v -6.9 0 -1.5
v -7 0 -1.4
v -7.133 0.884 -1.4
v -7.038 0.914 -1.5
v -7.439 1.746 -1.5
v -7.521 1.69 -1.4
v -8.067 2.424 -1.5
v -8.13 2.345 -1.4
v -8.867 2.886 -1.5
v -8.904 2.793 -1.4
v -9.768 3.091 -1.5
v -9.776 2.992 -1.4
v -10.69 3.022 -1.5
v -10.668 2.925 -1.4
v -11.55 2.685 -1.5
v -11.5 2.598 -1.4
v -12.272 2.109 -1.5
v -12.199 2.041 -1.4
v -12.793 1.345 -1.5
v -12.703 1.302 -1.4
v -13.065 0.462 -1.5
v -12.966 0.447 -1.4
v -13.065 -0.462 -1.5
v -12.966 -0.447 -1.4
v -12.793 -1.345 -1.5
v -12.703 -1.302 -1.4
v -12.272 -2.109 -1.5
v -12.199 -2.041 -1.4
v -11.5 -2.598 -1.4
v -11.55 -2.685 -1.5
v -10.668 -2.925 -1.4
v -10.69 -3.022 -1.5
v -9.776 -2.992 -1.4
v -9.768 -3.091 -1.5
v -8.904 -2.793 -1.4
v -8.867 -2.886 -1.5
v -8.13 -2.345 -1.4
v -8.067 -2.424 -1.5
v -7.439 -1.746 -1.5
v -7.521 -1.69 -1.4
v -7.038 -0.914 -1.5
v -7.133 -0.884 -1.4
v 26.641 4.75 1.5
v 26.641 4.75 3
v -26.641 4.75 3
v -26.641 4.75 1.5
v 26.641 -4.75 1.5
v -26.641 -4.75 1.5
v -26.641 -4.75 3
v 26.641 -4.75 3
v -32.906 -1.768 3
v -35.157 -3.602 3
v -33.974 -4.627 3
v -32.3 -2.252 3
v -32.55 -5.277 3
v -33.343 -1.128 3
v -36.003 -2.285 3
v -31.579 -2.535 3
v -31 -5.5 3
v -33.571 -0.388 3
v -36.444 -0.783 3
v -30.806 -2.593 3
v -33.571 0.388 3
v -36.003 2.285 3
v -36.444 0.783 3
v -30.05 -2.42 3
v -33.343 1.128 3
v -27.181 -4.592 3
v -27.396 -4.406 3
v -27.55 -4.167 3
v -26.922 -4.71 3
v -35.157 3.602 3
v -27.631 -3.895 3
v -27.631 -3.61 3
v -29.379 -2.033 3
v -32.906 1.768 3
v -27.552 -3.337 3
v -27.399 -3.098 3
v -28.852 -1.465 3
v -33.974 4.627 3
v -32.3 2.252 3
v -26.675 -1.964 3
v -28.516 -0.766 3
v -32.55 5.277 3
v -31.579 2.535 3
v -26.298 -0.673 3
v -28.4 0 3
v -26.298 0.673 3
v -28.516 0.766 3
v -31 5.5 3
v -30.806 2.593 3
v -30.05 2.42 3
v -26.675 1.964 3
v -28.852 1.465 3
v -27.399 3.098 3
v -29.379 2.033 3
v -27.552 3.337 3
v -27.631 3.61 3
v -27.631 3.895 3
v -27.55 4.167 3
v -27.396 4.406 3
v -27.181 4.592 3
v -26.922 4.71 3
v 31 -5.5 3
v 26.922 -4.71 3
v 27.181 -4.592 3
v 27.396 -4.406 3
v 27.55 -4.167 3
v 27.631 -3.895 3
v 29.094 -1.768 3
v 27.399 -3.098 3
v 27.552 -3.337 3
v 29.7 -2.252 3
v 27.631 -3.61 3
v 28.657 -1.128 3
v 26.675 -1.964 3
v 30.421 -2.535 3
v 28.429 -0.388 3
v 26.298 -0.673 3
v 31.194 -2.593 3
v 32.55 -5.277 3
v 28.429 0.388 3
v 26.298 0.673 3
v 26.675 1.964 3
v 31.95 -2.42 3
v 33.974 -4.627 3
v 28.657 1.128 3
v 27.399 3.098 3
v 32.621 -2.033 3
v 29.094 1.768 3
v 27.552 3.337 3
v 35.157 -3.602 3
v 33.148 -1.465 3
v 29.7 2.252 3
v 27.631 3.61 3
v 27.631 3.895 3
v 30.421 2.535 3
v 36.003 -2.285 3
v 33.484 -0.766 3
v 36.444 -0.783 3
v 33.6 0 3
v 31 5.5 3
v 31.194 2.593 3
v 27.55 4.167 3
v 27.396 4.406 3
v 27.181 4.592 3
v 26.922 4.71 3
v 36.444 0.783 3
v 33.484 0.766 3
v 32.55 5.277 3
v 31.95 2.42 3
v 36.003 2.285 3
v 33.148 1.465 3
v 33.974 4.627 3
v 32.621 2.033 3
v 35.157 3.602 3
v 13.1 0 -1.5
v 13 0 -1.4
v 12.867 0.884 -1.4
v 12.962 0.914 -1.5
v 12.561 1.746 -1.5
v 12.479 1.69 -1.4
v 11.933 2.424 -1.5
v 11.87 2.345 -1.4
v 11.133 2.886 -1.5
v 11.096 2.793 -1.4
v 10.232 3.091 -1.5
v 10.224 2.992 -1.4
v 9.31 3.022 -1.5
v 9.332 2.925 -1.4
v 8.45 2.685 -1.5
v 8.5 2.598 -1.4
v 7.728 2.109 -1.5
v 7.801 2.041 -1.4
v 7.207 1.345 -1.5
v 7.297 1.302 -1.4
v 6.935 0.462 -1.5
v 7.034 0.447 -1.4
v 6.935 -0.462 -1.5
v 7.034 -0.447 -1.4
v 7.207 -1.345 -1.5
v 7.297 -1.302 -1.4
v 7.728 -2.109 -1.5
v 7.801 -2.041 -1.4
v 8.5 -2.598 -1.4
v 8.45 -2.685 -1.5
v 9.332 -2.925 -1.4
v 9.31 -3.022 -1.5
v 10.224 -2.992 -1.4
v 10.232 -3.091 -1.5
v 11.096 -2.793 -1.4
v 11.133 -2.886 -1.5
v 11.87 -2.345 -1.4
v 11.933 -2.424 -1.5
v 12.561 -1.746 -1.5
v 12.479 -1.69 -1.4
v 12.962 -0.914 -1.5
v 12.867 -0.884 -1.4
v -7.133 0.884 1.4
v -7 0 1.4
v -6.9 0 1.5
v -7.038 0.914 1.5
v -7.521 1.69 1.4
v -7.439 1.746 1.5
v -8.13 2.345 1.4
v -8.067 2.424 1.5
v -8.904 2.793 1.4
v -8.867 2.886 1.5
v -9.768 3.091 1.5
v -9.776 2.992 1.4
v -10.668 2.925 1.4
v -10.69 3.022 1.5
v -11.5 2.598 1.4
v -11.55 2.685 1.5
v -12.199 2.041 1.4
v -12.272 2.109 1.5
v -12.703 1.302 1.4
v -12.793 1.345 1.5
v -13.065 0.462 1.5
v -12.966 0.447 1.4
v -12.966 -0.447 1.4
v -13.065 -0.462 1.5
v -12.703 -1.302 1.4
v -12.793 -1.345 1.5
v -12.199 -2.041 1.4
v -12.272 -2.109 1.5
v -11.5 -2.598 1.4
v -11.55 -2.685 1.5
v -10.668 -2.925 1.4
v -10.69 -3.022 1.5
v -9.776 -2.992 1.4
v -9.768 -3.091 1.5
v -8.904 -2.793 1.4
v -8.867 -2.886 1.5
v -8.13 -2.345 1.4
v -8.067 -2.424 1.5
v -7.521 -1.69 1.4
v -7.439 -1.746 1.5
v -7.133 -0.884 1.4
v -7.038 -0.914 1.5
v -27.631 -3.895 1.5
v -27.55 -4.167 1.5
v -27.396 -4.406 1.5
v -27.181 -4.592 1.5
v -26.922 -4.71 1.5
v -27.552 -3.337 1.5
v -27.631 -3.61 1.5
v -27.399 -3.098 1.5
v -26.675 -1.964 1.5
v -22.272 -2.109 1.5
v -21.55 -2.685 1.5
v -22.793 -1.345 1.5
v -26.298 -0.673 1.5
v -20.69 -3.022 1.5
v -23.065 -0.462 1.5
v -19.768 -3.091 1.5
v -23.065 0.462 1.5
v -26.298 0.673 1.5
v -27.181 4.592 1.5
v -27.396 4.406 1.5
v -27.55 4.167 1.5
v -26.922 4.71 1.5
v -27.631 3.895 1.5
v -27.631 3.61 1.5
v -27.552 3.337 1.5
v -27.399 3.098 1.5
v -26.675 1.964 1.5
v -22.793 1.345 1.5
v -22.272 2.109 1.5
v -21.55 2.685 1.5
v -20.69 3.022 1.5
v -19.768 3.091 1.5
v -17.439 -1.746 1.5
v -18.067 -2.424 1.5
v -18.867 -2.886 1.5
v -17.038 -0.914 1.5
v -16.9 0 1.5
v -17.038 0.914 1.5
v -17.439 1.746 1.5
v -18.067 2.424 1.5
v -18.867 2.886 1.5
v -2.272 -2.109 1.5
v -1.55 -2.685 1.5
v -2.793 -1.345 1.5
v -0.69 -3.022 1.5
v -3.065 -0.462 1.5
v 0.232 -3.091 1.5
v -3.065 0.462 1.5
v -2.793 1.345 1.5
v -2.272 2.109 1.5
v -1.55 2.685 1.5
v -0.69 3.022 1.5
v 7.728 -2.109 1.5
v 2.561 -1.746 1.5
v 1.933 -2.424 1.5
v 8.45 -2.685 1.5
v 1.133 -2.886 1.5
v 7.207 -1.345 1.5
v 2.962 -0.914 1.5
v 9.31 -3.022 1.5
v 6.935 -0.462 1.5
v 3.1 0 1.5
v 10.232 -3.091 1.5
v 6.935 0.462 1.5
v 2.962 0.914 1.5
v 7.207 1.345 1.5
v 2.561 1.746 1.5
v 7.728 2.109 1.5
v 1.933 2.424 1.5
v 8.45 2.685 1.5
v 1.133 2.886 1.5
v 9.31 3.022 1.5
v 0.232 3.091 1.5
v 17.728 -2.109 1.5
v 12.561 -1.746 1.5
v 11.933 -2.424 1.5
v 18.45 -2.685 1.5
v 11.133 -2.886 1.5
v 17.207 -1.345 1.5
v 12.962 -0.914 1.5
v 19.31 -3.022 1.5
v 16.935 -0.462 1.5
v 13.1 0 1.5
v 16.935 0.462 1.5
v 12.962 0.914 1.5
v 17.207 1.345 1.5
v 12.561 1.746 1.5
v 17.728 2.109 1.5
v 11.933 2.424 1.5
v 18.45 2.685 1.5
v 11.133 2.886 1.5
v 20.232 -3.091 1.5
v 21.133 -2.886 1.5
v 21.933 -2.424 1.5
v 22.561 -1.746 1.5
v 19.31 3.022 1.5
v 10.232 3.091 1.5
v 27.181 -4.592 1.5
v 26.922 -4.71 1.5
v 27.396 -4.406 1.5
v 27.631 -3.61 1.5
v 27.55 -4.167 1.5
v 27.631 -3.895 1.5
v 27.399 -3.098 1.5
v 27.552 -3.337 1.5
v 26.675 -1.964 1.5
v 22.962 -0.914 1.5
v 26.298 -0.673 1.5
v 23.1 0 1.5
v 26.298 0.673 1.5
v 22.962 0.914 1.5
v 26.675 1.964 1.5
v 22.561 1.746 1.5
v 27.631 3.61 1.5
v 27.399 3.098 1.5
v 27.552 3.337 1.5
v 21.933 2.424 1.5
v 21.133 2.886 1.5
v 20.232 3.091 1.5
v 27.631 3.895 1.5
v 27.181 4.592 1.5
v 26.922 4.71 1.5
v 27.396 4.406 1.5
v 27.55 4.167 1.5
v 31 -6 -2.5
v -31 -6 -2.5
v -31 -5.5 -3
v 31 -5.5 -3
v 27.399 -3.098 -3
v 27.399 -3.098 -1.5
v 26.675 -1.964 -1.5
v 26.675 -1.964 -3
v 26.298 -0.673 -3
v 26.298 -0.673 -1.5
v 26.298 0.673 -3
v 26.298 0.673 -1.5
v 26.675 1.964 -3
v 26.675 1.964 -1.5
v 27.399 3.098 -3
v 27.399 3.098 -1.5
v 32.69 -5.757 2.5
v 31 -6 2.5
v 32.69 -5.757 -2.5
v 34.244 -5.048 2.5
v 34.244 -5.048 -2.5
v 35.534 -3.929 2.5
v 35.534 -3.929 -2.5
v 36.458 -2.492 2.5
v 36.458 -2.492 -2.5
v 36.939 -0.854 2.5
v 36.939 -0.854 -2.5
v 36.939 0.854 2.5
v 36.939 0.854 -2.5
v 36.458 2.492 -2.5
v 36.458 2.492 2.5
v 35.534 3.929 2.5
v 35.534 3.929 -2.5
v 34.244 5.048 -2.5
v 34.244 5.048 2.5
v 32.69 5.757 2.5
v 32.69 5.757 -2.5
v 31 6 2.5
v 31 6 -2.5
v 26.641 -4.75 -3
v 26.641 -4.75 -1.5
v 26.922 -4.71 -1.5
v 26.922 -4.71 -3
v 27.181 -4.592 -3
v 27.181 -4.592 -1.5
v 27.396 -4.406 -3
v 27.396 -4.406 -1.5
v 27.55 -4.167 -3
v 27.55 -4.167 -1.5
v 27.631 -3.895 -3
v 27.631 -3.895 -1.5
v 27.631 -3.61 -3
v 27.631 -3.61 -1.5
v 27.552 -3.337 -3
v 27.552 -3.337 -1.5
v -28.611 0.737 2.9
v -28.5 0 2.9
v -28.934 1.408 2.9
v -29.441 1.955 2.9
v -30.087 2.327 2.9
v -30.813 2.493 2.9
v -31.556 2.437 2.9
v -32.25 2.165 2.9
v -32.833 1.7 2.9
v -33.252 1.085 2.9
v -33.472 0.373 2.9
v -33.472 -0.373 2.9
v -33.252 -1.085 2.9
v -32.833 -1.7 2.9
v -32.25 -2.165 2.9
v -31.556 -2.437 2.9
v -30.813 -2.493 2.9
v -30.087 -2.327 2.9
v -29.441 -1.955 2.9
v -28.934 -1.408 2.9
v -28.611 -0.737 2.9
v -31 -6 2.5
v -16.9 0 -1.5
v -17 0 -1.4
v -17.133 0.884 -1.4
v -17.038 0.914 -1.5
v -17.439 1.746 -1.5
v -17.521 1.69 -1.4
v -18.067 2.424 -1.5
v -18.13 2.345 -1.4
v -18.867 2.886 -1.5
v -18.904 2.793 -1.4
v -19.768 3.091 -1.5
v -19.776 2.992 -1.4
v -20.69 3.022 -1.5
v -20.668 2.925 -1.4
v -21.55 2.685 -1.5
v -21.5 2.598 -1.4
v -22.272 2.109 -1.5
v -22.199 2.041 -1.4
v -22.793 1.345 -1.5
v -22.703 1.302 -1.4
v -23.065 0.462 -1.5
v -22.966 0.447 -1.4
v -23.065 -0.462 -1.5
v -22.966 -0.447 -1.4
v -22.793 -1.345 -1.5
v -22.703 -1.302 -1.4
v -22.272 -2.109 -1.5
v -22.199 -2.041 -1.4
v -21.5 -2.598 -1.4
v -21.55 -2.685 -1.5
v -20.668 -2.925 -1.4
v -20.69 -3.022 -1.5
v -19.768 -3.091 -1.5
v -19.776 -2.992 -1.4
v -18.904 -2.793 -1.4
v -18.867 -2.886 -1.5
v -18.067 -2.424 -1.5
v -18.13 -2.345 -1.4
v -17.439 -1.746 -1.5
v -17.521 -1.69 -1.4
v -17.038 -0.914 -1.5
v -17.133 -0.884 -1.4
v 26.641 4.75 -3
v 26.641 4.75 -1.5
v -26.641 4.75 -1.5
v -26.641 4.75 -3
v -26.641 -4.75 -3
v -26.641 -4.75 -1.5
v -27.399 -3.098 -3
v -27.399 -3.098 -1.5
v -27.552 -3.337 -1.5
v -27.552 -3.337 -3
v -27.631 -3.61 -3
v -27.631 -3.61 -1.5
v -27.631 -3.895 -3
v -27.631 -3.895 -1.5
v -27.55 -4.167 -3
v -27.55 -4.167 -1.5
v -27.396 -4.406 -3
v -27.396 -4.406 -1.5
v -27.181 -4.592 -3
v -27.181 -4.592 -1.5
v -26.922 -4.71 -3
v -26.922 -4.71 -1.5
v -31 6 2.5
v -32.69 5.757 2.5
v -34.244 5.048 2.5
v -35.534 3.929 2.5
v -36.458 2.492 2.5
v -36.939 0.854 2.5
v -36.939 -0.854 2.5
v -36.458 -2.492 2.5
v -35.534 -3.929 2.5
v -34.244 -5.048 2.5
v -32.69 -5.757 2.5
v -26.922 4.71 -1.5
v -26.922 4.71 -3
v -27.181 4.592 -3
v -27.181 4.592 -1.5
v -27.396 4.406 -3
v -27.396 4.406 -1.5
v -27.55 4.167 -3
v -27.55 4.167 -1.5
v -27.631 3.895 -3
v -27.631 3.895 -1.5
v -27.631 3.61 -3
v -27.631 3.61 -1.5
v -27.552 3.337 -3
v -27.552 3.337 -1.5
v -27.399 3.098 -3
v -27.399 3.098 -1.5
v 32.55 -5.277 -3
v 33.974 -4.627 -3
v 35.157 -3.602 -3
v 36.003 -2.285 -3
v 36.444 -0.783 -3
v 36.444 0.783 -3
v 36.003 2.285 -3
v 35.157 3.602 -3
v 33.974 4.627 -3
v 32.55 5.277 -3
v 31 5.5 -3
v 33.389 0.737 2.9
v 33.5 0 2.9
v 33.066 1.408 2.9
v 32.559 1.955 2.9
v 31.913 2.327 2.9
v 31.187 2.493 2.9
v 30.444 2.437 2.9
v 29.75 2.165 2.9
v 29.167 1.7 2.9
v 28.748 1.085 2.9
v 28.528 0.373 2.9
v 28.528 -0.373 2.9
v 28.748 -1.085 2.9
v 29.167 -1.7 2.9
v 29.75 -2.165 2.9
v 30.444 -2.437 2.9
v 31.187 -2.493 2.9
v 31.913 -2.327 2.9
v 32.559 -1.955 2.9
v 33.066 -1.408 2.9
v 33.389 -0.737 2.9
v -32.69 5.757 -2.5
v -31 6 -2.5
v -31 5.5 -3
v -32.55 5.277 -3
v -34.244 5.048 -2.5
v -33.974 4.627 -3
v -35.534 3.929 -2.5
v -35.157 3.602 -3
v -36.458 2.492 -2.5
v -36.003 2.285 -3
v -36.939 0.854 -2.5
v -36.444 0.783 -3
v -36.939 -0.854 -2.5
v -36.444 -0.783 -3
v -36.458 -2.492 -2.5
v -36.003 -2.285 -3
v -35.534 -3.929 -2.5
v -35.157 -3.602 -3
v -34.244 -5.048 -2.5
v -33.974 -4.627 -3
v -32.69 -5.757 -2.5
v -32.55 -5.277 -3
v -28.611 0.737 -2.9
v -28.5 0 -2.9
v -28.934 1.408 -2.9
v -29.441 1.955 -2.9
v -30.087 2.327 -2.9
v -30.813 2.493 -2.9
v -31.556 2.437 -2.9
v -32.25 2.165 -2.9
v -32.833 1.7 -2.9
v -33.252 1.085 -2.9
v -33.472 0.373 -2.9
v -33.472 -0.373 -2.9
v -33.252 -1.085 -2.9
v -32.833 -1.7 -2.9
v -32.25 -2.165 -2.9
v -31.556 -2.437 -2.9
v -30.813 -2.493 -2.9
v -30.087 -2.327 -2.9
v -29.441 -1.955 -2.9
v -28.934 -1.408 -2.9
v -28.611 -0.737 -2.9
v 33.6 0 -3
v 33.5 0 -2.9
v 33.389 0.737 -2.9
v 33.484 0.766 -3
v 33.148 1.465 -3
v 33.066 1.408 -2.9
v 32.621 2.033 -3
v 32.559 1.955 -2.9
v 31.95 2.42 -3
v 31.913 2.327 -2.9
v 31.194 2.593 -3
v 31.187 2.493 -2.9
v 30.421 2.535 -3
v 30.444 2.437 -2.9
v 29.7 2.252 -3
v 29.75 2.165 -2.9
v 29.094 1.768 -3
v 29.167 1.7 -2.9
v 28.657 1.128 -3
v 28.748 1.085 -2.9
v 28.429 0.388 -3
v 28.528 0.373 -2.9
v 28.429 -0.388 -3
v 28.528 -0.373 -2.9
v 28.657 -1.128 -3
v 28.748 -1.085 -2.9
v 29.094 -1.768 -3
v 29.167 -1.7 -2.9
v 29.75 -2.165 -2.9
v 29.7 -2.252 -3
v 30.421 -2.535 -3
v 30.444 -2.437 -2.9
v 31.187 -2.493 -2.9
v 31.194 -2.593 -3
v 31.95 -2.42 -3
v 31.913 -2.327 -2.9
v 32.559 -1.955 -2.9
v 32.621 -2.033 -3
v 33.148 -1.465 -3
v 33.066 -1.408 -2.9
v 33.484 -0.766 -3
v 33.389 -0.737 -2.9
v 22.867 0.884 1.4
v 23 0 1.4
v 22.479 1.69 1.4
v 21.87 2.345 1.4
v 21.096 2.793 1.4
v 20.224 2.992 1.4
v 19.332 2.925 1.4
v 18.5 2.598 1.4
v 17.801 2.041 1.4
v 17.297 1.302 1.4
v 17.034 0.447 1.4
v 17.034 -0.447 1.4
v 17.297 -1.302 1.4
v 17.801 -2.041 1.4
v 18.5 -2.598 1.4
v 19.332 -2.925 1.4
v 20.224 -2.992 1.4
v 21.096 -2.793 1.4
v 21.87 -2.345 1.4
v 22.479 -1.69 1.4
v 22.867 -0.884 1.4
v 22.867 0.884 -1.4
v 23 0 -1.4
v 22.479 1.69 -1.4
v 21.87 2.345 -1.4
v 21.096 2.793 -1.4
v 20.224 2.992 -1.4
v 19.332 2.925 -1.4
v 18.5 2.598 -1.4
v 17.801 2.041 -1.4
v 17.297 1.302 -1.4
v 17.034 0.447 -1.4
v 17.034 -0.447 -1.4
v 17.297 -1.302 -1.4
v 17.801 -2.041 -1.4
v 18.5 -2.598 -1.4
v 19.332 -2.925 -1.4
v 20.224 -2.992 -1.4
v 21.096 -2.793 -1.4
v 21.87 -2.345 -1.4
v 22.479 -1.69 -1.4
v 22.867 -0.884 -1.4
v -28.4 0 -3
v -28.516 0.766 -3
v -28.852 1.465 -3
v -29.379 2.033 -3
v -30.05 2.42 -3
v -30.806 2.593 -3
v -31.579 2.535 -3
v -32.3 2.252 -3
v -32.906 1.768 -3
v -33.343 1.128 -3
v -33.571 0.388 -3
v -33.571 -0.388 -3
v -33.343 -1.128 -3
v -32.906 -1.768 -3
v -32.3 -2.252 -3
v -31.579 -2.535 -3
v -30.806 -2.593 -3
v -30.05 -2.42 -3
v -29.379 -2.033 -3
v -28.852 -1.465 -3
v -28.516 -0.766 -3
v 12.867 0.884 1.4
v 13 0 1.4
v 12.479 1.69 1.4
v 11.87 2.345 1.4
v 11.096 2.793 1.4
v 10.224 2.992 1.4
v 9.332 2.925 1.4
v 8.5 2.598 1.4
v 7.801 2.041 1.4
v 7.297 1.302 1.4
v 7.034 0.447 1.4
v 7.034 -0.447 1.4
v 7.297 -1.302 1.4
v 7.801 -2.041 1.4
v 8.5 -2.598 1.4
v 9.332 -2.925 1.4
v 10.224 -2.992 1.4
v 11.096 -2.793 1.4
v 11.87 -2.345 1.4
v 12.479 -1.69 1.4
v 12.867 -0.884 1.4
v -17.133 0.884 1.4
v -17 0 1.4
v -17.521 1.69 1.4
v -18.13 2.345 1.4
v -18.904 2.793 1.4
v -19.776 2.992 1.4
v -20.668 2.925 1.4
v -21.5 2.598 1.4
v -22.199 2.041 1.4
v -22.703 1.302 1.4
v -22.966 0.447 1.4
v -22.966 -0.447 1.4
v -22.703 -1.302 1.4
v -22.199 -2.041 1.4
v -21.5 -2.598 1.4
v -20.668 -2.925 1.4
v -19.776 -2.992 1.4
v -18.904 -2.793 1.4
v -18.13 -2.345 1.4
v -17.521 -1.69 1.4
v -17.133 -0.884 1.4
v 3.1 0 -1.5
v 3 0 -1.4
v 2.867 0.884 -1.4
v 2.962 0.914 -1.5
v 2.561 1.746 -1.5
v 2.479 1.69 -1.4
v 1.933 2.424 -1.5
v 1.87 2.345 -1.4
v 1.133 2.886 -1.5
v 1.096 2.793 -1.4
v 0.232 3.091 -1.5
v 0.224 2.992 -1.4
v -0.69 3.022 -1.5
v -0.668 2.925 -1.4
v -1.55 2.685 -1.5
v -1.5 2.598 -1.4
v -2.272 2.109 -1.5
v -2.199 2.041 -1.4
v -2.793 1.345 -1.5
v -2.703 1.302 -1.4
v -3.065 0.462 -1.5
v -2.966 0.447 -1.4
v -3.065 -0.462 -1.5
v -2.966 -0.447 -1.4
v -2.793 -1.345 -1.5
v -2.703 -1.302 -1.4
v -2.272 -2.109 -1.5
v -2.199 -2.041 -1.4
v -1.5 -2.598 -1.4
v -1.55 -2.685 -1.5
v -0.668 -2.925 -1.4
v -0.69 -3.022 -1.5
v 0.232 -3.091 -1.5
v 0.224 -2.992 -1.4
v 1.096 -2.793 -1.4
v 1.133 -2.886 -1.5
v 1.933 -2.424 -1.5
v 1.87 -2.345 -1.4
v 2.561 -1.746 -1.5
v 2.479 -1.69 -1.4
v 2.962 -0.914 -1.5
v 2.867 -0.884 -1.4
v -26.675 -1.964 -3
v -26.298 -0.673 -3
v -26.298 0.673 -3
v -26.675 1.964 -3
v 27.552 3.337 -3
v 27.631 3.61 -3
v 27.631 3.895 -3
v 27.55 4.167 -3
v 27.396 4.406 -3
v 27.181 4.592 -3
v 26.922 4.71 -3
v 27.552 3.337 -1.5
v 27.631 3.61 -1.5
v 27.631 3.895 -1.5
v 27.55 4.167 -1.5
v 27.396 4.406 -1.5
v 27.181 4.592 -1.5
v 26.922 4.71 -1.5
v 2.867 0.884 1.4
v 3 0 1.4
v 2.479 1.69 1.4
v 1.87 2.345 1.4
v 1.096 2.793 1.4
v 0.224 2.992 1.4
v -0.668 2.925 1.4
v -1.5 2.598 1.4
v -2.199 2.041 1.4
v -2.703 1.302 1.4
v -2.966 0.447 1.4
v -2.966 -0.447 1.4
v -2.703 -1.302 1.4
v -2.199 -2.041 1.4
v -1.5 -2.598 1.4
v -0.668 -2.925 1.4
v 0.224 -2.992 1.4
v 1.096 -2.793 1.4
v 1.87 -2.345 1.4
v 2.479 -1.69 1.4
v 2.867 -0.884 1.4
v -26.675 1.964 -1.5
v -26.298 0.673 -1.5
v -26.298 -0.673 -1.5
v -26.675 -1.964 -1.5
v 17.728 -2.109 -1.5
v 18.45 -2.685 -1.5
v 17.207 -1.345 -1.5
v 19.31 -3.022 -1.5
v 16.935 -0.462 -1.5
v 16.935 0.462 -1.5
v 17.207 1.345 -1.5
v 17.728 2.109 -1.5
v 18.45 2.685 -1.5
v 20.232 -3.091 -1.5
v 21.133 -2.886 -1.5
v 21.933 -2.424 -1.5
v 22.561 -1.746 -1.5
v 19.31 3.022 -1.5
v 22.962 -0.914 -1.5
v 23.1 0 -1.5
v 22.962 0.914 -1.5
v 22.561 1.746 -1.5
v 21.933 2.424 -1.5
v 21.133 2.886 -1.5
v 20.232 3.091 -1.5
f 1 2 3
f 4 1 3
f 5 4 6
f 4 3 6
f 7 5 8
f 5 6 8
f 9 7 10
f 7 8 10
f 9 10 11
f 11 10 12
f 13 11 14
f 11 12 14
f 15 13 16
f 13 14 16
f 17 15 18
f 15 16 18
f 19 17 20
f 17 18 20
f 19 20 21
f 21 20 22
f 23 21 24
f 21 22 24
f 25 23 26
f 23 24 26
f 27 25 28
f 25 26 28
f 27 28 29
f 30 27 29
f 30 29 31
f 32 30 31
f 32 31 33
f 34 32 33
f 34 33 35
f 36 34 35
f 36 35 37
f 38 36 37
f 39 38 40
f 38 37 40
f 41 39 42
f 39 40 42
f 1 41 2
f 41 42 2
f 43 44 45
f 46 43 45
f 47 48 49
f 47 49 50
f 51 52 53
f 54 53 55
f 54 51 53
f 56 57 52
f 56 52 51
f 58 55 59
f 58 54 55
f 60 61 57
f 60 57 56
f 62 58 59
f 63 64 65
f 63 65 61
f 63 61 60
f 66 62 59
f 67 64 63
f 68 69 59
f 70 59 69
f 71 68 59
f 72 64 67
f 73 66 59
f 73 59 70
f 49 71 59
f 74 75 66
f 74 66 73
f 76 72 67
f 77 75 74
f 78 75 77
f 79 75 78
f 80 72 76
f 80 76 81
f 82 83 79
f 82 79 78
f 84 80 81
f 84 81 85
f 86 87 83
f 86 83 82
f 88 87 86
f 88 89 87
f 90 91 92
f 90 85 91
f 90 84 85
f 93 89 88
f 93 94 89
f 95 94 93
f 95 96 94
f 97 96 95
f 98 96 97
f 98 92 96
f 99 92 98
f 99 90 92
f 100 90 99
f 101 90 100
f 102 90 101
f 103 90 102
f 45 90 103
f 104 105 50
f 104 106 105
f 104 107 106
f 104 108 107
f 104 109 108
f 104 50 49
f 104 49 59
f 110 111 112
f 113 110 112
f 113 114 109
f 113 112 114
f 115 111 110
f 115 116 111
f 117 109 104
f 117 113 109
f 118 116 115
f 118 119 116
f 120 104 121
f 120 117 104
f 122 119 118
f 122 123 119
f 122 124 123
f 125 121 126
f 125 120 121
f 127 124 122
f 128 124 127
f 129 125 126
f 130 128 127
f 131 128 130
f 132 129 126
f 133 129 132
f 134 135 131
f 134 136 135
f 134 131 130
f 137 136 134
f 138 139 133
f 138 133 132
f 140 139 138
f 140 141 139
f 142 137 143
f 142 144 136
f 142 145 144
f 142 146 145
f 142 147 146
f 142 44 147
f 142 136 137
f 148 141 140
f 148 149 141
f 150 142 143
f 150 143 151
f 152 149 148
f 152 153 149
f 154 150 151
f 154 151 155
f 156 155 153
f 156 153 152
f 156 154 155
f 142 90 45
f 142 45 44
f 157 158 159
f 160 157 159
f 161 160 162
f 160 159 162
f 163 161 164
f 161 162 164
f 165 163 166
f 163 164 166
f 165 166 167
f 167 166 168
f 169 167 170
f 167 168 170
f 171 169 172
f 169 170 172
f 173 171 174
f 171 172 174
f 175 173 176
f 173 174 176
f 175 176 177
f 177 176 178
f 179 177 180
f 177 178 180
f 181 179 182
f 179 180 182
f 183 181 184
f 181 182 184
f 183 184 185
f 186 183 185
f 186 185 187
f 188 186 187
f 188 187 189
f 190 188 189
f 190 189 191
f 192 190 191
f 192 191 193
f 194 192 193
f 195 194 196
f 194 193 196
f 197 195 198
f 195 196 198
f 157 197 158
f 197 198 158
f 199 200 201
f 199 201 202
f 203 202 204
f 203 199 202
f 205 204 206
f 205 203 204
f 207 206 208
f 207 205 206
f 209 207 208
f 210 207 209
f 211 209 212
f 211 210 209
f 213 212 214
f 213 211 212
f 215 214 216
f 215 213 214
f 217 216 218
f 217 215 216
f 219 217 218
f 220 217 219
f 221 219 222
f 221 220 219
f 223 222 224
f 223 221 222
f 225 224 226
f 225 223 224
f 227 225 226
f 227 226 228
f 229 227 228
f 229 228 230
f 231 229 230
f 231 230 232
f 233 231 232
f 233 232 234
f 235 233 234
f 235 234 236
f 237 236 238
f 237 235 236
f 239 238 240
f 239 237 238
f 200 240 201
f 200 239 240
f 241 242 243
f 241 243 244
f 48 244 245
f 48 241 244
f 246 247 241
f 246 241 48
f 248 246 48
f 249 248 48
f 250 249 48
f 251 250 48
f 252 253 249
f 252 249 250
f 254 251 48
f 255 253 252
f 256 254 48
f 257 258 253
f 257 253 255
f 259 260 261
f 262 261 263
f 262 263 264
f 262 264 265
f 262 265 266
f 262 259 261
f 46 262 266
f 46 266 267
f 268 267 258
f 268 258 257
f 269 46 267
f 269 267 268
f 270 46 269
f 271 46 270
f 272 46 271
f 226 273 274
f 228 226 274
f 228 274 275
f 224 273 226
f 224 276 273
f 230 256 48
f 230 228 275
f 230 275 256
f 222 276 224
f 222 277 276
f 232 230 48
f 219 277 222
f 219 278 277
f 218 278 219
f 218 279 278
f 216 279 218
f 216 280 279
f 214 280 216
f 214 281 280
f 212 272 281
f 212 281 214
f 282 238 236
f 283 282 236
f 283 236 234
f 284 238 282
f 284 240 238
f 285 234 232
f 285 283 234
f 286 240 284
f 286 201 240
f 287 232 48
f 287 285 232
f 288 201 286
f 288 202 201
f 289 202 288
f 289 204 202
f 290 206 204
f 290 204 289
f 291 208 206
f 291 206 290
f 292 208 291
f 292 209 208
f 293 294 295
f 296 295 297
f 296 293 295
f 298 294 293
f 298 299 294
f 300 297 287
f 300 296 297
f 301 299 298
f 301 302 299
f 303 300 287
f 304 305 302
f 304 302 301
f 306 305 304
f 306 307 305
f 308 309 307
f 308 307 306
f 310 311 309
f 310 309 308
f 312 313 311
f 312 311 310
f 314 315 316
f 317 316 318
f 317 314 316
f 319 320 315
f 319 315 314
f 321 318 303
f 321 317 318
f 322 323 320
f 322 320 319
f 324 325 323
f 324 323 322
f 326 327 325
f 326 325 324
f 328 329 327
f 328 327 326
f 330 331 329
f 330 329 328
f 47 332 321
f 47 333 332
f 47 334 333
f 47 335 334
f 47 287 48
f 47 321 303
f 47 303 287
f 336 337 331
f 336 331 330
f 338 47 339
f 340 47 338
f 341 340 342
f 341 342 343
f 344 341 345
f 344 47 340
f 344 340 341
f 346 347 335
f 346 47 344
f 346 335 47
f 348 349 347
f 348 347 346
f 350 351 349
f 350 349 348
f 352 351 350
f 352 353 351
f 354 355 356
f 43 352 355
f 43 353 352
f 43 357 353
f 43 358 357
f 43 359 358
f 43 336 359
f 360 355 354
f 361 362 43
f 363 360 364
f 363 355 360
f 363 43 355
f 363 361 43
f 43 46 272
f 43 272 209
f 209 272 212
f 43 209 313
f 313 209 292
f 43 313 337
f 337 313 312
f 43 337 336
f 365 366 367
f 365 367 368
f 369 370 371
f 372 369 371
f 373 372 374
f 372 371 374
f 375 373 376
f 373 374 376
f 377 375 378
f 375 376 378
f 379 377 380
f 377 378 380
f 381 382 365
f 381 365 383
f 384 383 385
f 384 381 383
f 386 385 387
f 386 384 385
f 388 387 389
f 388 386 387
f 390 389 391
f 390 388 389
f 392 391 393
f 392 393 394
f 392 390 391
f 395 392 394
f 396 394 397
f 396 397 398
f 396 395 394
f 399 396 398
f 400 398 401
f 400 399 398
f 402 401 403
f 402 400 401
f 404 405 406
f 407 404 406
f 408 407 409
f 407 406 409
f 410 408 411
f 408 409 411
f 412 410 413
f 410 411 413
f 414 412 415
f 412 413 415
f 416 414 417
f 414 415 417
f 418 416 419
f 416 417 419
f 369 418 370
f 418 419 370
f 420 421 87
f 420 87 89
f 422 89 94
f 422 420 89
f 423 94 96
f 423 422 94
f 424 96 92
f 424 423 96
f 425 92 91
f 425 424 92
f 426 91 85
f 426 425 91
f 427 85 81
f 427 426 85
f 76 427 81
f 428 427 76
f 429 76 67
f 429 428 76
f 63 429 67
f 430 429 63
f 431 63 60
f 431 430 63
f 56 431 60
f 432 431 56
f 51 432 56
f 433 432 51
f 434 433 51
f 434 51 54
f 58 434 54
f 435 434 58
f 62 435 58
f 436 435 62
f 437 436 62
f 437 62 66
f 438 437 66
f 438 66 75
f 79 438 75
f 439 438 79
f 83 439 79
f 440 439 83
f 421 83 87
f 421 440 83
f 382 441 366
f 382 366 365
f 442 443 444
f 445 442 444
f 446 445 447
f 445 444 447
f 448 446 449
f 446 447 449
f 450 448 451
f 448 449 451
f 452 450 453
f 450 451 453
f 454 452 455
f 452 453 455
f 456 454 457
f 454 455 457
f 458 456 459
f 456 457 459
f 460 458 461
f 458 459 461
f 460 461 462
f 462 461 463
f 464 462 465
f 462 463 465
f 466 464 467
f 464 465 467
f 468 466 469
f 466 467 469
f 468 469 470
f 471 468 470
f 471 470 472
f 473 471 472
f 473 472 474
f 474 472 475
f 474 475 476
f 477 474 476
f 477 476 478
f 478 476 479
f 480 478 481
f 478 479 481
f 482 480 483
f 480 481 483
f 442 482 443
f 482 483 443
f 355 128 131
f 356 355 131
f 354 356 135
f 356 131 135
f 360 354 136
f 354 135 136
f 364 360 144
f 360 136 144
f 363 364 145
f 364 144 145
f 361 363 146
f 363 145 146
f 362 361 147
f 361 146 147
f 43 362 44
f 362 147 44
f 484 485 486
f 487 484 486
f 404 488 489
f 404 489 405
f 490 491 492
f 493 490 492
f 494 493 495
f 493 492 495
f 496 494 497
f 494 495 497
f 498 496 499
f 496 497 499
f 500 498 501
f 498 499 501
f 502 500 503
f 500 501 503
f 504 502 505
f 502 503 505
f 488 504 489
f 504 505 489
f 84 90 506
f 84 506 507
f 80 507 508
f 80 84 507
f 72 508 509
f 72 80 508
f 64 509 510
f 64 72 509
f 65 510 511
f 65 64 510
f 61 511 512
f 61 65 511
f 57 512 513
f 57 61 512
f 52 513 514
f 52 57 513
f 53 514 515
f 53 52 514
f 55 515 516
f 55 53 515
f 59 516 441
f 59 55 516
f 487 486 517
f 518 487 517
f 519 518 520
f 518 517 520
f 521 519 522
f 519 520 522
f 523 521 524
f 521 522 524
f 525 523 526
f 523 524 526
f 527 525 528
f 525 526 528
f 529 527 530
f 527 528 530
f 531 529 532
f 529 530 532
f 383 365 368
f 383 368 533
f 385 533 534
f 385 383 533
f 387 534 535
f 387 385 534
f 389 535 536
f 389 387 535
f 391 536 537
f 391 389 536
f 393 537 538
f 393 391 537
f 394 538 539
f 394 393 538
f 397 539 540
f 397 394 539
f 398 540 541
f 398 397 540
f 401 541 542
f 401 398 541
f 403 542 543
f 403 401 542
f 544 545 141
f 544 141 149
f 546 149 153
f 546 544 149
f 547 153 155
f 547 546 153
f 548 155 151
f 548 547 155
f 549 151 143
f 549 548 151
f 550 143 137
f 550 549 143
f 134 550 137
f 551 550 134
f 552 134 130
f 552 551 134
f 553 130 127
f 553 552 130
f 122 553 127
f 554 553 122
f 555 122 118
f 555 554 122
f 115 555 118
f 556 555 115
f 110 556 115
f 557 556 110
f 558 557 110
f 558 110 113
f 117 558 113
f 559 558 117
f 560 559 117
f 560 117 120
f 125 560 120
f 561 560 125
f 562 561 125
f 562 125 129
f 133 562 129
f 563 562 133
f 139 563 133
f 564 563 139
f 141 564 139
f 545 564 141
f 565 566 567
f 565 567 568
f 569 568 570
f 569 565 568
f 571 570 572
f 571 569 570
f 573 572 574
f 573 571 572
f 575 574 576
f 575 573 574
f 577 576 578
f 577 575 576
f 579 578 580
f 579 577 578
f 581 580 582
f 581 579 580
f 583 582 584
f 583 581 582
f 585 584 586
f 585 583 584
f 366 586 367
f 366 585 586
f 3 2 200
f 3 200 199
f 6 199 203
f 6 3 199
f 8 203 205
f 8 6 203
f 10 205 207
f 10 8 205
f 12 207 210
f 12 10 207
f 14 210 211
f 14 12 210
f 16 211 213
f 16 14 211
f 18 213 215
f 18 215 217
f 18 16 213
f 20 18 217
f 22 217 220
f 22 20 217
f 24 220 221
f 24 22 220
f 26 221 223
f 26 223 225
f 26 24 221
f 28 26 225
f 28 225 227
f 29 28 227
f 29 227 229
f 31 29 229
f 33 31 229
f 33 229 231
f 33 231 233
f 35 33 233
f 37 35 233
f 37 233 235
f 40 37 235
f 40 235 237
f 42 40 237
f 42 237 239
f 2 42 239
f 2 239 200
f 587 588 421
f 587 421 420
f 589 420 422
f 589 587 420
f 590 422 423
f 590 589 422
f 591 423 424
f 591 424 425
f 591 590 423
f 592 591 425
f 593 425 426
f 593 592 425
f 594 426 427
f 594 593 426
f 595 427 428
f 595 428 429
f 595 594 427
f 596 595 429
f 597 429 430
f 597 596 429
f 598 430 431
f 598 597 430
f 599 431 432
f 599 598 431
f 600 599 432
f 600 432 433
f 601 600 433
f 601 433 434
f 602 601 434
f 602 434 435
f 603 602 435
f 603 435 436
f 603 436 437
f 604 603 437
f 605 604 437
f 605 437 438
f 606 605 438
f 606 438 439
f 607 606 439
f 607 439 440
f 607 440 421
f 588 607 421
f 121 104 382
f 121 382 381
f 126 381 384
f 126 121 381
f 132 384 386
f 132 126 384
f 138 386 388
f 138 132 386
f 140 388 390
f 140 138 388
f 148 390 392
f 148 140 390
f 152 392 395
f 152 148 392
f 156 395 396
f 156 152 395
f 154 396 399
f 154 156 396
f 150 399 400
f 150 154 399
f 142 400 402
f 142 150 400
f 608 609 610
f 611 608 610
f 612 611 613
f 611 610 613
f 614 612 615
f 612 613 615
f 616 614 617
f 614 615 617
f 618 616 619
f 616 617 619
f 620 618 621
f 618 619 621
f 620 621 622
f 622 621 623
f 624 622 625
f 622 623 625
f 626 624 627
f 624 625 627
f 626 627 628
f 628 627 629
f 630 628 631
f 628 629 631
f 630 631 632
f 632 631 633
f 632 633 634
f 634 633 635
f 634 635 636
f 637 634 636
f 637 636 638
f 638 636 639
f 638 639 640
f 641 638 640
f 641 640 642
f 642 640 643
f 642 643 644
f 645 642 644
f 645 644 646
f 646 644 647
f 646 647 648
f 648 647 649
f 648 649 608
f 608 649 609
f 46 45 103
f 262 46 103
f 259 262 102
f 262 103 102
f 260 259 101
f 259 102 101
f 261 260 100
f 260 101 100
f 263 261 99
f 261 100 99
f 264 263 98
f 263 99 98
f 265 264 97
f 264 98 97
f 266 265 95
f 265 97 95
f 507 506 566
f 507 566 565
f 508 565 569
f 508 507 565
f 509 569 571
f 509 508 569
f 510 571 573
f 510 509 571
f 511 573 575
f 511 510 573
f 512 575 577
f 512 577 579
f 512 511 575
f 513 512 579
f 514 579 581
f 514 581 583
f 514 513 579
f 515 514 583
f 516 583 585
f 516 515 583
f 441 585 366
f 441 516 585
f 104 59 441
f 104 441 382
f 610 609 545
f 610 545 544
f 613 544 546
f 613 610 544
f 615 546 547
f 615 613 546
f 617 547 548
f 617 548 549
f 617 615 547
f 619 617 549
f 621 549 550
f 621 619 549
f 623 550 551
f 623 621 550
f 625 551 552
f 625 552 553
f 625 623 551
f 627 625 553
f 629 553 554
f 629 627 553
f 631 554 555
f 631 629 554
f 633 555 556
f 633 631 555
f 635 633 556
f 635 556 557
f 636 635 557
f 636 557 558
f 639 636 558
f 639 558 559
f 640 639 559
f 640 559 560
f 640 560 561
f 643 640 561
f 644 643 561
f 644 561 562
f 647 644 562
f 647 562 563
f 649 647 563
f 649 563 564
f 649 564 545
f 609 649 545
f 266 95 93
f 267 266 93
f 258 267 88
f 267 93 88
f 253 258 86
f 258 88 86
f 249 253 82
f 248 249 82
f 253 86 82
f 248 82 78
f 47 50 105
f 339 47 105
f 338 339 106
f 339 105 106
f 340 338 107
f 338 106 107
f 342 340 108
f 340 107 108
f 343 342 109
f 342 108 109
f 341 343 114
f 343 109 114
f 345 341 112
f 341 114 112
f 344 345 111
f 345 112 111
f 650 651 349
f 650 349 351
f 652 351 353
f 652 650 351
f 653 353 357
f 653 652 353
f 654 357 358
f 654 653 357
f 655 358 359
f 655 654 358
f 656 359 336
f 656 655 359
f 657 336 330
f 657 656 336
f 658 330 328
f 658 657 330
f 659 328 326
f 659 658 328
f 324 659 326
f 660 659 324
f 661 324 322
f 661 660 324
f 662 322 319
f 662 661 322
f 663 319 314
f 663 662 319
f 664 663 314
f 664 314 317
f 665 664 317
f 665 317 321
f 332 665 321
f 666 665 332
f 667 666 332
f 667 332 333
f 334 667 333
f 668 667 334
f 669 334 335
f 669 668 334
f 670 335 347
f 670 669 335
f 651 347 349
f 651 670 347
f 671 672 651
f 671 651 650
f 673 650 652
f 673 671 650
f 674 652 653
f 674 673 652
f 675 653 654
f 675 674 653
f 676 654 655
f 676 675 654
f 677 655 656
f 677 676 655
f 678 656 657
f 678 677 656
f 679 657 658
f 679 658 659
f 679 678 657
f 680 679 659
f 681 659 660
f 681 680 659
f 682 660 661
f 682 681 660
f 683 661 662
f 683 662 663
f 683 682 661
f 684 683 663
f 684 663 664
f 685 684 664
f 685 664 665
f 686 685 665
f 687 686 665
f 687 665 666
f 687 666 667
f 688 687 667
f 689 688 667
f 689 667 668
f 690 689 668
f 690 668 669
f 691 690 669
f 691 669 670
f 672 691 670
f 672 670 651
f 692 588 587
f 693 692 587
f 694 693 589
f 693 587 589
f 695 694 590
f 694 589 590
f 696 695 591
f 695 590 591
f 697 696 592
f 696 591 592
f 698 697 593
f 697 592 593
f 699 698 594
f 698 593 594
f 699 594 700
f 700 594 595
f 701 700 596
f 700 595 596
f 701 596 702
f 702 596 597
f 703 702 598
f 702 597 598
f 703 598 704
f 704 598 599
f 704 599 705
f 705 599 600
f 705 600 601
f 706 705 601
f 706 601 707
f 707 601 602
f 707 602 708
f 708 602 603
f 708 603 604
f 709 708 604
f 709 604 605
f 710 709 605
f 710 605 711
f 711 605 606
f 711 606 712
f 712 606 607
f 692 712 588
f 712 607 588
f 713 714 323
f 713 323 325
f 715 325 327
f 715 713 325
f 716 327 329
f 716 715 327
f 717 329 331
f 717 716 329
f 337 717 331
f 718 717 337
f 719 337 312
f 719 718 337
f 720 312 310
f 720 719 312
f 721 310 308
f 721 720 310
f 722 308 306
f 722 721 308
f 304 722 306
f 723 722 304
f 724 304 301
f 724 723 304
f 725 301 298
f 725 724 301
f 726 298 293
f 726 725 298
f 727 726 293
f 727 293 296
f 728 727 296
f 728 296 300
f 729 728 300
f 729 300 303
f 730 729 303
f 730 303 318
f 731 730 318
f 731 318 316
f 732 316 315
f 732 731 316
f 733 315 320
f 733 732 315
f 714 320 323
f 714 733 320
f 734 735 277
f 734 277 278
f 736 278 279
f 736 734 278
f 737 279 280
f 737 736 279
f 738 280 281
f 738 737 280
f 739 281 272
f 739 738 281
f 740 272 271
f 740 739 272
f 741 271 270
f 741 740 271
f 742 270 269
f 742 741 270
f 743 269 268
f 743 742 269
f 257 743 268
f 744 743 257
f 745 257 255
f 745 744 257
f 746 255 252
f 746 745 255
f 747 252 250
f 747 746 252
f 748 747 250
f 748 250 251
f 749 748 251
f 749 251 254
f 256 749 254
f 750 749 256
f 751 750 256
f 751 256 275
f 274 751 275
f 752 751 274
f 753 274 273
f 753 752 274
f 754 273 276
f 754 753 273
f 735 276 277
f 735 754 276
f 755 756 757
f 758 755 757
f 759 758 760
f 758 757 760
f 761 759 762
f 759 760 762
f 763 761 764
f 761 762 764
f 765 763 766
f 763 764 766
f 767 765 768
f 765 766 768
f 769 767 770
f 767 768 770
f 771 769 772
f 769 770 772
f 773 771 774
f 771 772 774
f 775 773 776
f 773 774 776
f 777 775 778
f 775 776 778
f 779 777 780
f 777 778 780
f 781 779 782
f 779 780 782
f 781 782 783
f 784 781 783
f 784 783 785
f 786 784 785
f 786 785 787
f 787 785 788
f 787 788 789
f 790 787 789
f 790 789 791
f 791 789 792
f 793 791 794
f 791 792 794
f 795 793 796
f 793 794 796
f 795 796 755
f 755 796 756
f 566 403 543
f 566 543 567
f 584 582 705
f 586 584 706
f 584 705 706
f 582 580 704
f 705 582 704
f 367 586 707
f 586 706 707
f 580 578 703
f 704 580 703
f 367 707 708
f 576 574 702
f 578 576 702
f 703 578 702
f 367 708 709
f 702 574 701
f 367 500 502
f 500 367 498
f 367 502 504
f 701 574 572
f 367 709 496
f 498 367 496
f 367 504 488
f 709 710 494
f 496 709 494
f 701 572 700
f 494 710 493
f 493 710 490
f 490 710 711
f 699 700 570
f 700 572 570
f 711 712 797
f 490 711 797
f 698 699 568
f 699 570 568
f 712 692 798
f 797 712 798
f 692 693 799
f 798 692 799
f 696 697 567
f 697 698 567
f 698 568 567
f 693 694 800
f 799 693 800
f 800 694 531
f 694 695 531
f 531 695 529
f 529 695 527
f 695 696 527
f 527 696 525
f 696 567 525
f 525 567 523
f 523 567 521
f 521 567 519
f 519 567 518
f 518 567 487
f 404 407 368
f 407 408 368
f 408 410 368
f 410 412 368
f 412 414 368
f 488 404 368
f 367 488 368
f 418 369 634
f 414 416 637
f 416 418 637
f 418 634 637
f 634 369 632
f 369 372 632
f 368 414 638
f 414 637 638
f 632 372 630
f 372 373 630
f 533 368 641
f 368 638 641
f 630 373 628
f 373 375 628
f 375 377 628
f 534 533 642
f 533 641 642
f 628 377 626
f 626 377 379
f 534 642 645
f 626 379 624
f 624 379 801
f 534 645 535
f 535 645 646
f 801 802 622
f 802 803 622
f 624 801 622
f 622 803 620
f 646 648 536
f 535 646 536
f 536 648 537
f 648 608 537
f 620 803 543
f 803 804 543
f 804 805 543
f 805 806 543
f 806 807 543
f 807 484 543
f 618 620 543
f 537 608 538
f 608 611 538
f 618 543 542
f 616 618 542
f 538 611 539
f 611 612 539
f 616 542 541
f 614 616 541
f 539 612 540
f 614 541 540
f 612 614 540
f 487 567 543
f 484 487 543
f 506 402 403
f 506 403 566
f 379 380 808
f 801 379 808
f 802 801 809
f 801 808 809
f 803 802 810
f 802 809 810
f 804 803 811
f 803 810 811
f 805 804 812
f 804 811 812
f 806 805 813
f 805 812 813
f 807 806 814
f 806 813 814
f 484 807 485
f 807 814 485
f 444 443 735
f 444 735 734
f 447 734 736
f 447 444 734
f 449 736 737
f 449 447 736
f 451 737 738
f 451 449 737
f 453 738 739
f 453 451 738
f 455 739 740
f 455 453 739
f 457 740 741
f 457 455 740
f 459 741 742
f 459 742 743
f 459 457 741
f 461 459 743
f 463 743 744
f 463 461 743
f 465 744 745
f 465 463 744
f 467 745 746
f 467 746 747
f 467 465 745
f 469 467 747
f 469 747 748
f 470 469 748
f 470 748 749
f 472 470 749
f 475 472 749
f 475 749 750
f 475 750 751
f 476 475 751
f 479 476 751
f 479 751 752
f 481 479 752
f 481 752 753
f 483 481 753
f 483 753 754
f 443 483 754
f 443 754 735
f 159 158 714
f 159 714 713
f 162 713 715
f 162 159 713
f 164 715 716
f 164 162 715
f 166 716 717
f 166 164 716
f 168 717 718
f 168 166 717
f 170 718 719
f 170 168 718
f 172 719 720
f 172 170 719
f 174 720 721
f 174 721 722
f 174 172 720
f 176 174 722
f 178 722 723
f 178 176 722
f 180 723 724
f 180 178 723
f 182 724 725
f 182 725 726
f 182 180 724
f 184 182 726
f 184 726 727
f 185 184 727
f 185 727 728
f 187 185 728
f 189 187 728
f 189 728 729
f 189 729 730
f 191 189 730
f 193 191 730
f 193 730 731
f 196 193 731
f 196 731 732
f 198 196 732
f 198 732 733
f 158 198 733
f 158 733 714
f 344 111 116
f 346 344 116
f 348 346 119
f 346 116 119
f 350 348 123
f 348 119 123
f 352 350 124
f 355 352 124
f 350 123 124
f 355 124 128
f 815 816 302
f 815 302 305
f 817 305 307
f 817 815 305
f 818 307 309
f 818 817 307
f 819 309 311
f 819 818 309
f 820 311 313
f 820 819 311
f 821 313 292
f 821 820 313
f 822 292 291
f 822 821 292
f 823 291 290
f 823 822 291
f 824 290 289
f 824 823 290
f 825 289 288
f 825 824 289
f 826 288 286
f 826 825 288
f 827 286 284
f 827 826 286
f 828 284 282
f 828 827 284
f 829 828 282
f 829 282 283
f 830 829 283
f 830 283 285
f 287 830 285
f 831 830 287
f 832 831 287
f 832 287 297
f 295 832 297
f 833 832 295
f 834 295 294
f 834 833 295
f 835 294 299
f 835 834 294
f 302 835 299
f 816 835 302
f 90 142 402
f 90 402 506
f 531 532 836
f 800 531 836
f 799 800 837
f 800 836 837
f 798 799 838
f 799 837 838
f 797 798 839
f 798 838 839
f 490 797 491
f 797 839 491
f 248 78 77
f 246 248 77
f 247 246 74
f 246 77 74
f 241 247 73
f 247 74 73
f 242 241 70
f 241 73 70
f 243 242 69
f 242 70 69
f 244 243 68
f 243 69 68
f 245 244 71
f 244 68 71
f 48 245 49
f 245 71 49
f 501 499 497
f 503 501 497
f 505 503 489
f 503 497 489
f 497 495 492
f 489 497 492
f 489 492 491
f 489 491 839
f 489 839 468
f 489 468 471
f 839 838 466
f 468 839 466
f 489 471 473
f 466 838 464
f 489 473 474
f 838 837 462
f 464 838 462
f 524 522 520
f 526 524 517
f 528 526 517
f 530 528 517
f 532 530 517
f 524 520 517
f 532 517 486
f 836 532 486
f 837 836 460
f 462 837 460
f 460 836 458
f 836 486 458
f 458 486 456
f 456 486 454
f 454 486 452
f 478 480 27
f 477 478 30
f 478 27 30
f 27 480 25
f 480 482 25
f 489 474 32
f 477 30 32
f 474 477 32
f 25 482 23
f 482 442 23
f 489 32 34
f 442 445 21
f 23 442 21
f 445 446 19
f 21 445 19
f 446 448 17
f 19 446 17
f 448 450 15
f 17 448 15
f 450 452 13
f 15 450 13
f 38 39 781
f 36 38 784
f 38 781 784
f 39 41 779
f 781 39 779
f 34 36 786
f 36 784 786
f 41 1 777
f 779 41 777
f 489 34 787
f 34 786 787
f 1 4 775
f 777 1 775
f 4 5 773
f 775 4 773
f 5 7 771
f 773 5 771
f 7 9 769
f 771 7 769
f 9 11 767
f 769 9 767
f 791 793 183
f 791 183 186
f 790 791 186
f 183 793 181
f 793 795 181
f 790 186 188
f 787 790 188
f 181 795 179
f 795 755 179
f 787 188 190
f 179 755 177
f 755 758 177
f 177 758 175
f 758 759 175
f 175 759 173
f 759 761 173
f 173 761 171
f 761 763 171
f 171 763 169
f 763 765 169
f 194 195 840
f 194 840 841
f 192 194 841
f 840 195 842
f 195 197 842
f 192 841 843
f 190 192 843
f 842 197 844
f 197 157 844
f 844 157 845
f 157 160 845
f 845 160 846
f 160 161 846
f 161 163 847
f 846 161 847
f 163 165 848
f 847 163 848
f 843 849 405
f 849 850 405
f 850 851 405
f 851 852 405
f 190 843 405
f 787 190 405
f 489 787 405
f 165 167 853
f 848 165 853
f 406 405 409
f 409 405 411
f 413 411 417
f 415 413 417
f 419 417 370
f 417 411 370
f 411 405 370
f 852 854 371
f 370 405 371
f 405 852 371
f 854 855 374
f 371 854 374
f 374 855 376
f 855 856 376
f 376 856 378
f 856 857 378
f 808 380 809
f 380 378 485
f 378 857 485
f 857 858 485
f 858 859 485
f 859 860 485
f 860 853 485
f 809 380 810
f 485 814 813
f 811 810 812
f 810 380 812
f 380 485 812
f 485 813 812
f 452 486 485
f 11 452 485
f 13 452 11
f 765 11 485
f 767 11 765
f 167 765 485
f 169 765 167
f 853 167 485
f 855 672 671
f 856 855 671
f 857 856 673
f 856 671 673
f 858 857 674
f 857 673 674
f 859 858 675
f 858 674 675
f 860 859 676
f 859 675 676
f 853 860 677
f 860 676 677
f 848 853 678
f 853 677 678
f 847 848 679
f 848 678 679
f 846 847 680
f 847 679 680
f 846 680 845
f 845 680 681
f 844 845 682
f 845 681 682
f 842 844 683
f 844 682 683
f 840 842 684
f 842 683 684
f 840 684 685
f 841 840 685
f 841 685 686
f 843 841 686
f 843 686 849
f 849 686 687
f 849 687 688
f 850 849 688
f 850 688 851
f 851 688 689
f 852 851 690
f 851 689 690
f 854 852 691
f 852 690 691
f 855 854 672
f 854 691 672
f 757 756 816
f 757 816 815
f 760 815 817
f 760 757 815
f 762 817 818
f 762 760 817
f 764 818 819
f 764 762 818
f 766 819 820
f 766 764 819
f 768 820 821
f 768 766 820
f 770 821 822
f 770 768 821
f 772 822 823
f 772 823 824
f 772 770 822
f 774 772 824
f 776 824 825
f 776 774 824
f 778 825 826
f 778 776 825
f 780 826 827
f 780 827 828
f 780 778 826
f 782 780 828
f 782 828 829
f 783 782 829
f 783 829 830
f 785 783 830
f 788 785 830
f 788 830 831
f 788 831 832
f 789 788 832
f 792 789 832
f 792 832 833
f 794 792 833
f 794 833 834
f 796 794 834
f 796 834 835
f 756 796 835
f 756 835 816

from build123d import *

# Parameters (mm, degrees)
SKETCH1_R           = 2.5
BOSS_EXTRUDE1_DEPTH = 3
SKETCH1_3_R         = 3
BOSS_EXTRUDE2_DEPTH = 1.5
CHAMFER1_SIZE       = 0.5
CHAMFER3_SIZE       = 0.1


with BuildPart() as part:
    # Sketch1 → Boss-Extrude1 (new, symmetric)
    with BuildSketch(Plane.XY):
        with BuildLine():
            Line((-31, -6), (31, -6))
            ThreePointArc((31, -6), (37, 0), (31, 6))
            Line((31, 6), (-31, 6))
            ThreePointArc((-31, 6), (-37, 0), (-31, -6))
        make_face()
        with Locations((31, 0)):
            Circle(SKETCH1_R, mode=Mode.SUBTRACT)
        with Locations((-31, 0)):
            Circle(SKETCH1_R, mode=Mode.SUBTRACT)
        with BuildLine():
            ThreePointArc((26.641101056, -4.75), (27.549994316, -4.167028828), (27.399170438, -3.097826087))
            ThreePointArc((27.399170438, -3.097826087), (26.25, 0), (27.399170438, 3.097826087))
            ThreePointArc((27.399170438, 3.097826087), (27.549994316, 4.167028828), (26.641101056, 4.75))
            Line((26.641101056, 4.75), (-26.641101056, 4.75))
            ThreePointArc((-26.641101056, 4.75), (-27.549994316, 4.167028828), (-27.399170438, 3.097826087))
            ThreePointArc((-27.399170438, 3.097826087), (-26.25, 0), (-27.399170438, -3.097826087))
            ThreePointArc((-27.399170438, -3.097826087), (-27.549994316, -4.167028828), (-26.641101056, -4.75))
            Line((-26.641101056, -4.75), (26.641101056, -4.75))
        make_face(mode=Mode.SUBTRACT)
    extrude(amount=BOSS_EXTRUDE1_DEPTH, both=True)

    # Sketch1<3> → Boss-Extrude2 (add, symmetric)
    with BuildSketch(Plane.XY):
        with BuildLine():
            Line((-26.641101056, -4.75), (26.641101056, -4.75))
            ThreePointArc((26.641101056, -4.75), (27.549994316, -4.167028828), (27.399170438, -3.097826087))
            ThreePointArc((27.399170438, -3.097826087), (26.25, 0), (27.399170438, 3.097826087))
            ThreePointArc((27.399170438, 3.097826087), (27.549994316, 4.167028828), (26.641101056, 4.75))
            Line((26.641101056, 4.75), (-26.641101056, 4.75))
            ThreePointArc((-26.641101056, 4.75), (-27.549994316, 4.167028828), (-27.399170438, 3.097826087))
            ThreePointArc((-27.399170438, 3.097826087), (-26.25, 0), (-27.399170438, -3.097826087))
            ThreePointArc((-27.399170438, -3.097826087), (-27.549994316, -4.167028828), (-26.641101056, -4.75))
        make_face()
        Circle(SKETCH1_3_R, mode=Mode.SUBTRACT)
        with Locations((10, 0)):
            Circle(SKETCH1_3_R, mode=Mode.SUBTRACT)
        with Locations((20, 0)):
            Circle(SKETCH1_3_R, mode=Mode.SUBTRACT)
        with Locations((-10, 0)):
            Circle(SKETCH1_3_R, mode=Mode.SUBTRACT)
        with Locations((-20, 0)):
            Circle(SKETCH1_3_R, mode=Mode.SUBTRACT)
    extrude(amount=BOSS_EXTRUDE2_DEPTH, both=True)

    # Chamfer1
    chamfer1_edges = [part.edges().sort_by_distance(p)[0] for p in [
        (-37, 0, -3),
        (0, 6, -3),
        (37, 0, -3),
        (0, -6, -3),
        (0, -6, 3),
        (37, 0, 3),
        (0, 6, 3),
        (-37, 0, 3),
    ]]
    chamfer(chamfer1_edges, length=CHAMFER1_SIZE)

    # Chamfer3
    chamfer3_edges = [part.edges().sort_by_distance(p)[0] for p in [
        (-33.5, 0, -3),
        (28.5, 0, -3),
        (28.5, 0, 3),
        (-33.5, 0, 3),
        (-23, 0, 1.5),
        (-13, 0, 1.5),
        (17, 0, 1.5),
        (7, 0, 1.5),
        (-3, 0, 1.5),
        (-3, 0, -1.5),
        (7, 0, -1.5),
        (17, 0, -1.5),
        (-13, 0, -1.5),
        (-23, 0, -1.5),
    ]]
    chamfer(chamfer3_edges, length=CHAMFER3_SIZE)


solid = part.part
